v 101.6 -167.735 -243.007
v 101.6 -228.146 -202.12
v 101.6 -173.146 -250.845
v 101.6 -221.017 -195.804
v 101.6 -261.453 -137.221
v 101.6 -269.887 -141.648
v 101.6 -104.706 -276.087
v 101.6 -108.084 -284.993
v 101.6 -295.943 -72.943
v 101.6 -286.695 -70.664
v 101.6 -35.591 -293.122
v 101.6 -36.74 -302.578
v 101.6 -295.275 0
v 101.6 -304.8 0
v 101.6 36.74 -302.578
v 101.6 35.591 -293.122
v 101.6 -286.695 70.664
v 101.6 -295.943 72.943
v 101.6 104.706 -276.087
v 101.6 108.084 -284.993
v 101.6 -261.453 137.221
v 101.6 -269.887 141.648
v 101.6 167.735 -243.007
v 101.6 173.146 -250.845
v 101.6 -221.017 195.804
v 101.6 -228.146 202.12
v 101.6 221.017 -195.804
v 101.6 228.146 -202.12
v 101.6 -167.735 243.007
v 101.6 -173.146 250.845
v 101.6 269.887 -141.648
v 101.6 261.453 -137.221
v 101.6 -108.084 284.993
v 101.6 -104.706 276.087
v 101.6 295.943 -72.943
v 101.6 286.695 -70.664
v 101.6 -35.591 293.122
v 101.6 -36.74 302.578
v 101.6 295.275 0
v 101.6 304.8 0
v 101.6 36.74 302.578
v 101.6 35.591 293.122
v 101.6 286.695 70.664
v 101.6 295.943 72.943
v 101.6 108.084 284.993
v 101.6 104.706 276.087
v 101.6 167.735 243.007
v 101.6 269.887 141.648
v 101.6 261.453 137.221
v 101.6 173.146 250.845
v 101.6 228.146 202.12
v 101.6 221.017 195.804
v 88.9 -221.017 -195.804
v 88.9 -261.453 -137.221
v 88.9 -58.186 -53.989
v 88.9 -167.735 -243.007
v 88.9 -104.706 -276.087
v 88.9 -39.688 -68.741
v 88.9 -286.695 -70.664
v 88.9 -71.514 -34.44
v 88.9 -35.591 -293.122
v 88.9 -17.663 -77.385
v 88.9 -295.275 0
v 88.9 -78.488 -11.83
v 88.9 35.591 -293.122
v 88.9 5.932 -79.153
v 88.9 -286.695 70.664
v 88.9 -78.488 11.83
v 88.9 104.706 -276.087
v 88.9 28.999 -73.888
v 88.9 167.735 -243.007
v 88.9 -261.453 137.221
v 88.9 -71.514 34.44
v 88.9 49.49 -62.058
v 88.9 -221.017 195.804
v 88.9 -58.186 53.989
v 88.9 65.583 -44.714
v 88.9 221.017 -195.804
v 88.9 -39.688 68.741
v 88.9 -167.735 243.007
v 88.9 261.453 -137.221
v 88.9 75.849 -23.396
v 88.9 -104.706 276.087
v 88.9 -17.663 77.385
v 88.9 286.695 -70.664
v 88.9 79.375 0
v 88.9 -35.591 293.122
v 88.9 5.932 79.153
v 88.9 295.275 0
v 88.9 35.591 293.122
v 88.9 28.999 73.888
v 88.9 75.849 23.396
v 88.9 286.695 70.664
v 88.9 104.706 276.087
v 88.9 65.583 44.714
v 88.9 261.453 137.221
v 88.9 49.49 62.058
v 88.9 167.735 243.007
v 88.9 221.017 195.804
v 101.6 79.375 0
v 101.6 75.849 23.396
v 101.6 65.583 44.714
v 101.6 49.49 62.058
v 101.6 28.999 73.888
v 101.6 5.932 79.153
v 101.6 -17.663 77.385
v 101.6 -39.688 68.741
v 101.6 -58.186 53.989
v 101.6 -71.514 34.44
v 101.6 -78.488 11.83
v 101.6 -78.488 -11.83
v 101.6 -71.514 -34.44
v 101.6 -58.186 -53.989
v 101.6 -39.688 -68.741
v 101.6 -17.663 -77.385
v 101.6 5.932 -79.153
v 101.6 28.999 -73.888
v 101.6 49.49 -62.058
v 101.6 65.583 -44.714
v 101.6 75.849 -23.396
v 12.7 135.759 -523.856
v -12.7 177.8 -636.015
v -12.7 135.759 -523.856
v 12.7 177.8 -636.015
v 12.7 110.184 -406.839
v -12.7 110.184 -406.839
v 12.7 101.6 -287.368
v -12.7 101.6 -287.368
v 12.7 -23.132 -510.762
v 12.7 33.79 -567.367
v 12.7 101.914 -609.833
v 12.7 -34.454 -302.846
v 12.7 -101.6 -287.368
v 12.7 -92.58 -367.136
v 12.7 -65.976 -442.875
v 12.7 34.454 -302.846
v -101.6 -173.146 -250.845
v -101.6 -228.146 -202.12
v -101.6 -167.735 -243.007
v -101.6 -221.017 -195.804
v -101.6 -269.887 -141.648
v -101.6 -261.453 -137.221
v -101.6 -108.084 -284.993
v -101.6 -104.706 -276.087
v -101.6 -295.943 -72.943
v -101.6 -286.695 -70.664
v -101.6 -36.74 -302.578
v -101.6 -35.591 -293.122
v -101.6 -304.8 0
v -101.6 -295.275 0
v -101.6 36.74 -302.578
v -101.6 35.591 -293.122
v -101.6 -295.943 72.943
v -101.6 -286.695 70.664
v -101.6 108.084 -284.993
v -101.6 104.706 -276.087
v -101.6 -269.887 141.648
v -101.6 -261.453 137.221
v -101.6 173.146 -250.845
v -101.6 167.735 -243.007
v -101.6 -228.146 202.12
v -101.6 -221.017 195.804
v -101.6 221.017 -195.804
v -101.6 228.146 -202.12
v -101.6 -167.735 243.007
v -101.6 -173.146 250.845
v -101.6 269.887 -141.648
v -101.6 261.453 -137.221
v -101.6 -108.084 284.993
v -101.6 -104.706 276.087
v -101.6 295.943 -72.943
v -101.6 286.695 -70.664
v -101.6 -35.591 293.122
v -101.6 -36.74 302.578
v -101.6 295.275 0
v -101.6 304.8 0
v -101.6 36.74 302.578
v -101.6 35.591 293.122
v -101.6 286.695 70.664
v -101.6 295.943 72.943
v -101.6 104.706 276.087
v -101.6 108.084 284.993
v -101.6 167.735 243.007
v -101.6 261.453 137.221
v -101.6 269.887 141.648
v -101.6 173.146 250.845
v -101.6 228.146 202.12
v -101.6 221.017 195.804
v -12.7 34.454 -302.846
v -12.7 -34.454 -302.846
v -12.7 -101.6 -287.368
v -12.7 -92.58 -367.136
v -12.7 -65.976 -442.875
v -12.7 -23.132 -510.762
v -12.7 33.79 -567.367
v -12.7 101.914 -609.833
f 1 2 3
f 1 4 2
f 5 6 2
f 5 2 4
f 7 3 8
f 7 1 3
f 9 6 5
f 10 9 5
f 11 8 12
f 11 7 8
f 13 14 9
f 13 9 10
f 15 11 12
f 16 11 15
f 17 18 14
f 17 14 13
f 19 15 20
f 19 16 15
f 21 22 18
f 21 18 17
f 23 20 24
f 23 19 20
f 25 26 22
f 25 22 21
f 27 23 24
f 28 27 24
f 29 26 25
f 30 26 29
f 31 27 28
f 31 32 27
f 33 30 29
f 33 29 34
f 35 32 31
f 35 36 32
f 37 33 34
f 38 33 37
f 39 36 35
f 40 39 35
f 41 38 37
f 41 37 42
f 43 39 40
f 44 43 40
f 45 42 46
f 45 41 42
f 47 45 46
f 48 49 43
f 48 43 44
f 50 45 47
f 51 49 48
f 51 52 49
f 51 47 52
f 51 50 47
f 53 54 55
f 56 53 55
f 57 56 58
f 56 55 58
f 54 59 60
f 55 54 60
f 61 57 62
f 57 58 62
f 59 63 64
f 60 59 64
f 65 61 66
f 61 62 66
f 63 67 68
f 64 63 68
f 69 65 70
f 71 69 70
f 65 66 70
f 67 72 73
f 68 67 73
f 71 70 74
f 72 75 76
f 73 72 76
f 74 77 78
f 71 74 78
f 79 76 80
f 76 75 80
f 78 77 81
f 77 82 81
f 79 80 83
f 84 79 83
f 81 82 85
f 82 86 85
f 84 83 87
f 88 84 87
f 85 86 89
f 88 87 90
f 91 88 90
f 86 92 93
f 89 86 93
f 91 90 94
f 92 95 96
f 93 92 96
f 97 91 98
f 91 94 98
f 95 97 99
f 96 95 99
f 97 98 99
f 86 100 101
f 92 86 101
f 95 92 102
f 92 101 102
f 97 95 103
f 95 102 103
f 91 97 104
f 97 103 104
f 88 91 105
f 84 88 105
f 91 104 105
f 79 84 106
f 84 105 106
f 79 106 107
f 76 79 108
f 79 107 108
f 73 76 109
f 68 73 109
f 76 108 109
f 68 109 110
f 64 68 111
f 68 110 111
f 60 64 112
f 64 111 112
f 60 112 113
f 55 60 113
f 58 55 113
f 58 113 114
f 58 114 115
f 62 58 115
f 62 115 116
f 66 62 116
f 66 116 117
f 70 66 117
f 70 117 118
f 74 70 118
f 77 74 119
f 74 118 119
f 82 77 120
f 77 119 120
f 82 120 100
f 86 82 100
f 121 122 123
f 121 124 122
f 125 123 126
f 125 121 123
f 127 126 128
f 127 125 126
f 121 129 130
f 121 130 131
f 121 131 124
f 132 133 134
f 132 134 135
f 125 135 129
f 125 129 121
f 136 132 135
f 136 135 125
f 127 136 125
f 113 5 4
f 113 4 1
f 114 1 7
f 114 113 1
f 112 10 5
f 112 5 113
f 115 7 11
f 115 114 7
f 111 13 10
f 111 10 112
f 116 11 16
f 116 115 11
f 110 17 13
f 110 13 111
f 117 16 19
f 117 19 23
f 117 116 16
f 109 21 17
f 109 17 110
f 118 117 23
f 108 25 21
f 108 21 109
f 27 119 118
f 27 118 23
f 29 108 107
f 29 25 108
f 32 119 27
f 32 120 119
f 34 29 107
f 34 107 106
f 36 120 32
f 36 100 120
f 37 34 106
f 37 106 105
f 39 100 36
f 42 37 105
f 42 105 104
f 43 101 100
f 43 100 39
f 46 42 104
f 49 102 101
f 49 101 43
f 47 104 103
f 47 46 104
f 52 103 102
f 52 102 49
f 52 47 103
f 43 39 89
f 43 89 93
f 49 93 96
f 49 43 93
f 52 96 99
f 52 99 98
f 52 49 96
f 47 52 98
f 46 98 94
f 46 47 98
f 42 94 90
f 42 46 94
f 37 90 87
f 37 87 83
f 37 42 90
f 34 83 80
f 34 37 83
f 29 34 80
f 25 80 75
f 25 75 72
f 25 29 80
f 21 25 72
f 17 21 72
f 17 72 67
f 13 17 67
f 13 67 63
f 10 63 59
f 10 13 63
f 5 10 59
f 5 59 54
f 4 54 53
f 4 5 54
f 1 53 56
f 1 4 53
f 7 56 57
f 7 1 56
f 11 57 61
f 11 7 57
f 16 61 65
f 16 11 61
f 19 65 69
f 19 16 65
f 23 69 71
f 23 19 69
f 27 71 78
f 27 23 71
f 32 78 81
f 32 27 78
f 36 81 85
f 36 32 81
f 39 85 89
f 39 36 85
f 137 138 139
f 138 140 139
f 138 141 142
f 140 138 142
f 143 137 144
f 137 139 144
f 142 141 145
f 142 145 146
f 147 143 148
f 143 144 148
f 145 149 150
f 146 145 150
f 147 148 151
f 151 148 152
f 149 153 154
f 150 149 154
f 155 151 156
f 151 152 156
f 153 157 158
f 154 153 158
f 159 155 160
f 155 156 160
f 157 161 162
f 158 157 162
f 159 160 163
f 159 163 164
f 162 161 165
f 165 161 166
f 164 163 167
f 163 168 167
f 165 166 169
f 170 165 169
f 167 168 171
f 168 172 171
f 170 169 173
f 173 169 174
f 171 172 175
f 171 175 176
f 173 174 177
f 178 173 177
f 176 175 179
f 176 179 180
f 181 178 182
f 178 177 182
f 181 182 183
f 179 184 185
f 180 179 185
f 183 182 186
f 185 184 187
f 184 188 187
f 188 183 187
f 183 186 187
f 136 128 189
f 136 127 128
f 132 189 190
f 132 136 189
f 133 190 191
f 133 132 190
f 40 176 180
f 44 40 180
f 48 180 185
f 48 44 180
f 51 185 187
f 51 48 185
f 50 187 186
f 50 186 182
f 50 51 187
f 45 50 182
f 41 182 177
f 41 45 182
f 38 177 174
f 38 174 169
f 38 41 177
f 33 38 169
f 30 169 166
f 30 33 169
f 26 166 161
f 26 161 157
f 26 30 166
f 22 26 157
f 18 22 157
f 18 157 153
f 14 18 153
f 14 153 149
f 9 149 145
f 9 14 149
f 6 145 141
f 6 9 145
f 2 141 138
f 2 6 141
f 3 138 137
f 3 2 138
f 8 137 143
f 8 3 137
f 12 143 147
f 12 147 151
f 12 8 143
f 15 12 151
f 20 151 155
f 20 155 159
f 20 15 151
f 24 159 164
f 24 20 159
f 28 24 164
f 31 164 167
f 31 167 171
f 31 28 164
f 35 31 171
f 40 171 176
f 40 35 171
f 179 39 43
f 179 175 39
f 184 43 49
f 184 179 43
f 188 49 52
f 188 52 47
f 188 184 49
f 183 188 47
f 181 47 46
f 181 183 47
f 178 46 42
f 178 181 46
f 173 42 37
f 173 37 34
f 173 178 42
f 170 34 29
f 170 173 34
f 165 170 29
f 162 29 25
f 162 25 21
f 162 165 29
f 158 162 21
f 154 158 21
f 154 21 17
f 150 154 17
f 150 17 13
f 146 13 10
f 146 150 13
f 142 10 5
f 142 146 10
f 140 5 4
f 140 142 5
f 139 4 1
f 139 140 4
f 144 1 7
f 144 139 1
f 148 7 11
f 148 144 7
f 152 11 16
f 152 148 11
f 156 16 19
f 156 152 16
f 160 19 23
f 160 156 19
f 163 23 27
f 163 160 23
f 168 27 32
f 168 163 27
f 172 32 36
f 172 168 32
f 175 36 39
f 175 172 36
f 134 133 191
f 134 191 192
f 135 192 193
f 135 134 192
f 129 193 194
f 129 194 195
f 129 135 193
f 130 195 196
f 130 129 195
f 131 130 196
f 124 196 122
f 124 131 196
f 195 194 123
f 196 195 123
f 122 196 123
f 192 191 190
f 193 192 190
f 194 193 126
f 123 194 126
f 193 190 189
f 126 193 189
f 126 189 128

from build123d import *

# Parameters (mm, degrees)
F1_DEPTH = 12.7
F2_R     = 304.8
F2_R_2   = 295.275
F3_DEPTH = 101.6
F4_R     = 295.275
F4_R_2   = 79.375
F5_DEPTH = 12.7


with BuildPart() as f1:
    # F0 (on Right) → F1 (new body, symmetric)
    with BuildSketch(Plane.YZ):
        with BuildLine():
            ThreePointArc((101.6, -287.368196), (0, -304.8), (-101.6, -287.368196))
            ThreePointArc((-101.6, -287.368196), (-23.131923, -510.761954), (177.8, -636.015188))
            ThreePointArc((177.8, -636.015188), (120.872219, -465.806676), (101.6, -287.368196))
        make_face()
    extrude(amount=F1_DEPTH, both=True)


with BuildPart() as f3:
    # F2 (on Right) → F3 (new body, symmetric)
    with BuildSketch(Plane.YZ):
        Circle(F2_R)
        Circle(F2_R_2, mode=Mode.SUBTRACT)
    extrude(amount=F3_DEPTH, both=True)


with BuildPart() as f5:
    # F4 (on face) → F5 (new body)
    with BuildSketch(Plane.YZ.offset(101.6)):
        Circle(F4_R)
        Circle(F4_R_2, mode=Mode.SUBTRACT)
    extrude(amount=-F5_DEPTH)


solid = Compound([f1.part, f3.part, f5.part])
